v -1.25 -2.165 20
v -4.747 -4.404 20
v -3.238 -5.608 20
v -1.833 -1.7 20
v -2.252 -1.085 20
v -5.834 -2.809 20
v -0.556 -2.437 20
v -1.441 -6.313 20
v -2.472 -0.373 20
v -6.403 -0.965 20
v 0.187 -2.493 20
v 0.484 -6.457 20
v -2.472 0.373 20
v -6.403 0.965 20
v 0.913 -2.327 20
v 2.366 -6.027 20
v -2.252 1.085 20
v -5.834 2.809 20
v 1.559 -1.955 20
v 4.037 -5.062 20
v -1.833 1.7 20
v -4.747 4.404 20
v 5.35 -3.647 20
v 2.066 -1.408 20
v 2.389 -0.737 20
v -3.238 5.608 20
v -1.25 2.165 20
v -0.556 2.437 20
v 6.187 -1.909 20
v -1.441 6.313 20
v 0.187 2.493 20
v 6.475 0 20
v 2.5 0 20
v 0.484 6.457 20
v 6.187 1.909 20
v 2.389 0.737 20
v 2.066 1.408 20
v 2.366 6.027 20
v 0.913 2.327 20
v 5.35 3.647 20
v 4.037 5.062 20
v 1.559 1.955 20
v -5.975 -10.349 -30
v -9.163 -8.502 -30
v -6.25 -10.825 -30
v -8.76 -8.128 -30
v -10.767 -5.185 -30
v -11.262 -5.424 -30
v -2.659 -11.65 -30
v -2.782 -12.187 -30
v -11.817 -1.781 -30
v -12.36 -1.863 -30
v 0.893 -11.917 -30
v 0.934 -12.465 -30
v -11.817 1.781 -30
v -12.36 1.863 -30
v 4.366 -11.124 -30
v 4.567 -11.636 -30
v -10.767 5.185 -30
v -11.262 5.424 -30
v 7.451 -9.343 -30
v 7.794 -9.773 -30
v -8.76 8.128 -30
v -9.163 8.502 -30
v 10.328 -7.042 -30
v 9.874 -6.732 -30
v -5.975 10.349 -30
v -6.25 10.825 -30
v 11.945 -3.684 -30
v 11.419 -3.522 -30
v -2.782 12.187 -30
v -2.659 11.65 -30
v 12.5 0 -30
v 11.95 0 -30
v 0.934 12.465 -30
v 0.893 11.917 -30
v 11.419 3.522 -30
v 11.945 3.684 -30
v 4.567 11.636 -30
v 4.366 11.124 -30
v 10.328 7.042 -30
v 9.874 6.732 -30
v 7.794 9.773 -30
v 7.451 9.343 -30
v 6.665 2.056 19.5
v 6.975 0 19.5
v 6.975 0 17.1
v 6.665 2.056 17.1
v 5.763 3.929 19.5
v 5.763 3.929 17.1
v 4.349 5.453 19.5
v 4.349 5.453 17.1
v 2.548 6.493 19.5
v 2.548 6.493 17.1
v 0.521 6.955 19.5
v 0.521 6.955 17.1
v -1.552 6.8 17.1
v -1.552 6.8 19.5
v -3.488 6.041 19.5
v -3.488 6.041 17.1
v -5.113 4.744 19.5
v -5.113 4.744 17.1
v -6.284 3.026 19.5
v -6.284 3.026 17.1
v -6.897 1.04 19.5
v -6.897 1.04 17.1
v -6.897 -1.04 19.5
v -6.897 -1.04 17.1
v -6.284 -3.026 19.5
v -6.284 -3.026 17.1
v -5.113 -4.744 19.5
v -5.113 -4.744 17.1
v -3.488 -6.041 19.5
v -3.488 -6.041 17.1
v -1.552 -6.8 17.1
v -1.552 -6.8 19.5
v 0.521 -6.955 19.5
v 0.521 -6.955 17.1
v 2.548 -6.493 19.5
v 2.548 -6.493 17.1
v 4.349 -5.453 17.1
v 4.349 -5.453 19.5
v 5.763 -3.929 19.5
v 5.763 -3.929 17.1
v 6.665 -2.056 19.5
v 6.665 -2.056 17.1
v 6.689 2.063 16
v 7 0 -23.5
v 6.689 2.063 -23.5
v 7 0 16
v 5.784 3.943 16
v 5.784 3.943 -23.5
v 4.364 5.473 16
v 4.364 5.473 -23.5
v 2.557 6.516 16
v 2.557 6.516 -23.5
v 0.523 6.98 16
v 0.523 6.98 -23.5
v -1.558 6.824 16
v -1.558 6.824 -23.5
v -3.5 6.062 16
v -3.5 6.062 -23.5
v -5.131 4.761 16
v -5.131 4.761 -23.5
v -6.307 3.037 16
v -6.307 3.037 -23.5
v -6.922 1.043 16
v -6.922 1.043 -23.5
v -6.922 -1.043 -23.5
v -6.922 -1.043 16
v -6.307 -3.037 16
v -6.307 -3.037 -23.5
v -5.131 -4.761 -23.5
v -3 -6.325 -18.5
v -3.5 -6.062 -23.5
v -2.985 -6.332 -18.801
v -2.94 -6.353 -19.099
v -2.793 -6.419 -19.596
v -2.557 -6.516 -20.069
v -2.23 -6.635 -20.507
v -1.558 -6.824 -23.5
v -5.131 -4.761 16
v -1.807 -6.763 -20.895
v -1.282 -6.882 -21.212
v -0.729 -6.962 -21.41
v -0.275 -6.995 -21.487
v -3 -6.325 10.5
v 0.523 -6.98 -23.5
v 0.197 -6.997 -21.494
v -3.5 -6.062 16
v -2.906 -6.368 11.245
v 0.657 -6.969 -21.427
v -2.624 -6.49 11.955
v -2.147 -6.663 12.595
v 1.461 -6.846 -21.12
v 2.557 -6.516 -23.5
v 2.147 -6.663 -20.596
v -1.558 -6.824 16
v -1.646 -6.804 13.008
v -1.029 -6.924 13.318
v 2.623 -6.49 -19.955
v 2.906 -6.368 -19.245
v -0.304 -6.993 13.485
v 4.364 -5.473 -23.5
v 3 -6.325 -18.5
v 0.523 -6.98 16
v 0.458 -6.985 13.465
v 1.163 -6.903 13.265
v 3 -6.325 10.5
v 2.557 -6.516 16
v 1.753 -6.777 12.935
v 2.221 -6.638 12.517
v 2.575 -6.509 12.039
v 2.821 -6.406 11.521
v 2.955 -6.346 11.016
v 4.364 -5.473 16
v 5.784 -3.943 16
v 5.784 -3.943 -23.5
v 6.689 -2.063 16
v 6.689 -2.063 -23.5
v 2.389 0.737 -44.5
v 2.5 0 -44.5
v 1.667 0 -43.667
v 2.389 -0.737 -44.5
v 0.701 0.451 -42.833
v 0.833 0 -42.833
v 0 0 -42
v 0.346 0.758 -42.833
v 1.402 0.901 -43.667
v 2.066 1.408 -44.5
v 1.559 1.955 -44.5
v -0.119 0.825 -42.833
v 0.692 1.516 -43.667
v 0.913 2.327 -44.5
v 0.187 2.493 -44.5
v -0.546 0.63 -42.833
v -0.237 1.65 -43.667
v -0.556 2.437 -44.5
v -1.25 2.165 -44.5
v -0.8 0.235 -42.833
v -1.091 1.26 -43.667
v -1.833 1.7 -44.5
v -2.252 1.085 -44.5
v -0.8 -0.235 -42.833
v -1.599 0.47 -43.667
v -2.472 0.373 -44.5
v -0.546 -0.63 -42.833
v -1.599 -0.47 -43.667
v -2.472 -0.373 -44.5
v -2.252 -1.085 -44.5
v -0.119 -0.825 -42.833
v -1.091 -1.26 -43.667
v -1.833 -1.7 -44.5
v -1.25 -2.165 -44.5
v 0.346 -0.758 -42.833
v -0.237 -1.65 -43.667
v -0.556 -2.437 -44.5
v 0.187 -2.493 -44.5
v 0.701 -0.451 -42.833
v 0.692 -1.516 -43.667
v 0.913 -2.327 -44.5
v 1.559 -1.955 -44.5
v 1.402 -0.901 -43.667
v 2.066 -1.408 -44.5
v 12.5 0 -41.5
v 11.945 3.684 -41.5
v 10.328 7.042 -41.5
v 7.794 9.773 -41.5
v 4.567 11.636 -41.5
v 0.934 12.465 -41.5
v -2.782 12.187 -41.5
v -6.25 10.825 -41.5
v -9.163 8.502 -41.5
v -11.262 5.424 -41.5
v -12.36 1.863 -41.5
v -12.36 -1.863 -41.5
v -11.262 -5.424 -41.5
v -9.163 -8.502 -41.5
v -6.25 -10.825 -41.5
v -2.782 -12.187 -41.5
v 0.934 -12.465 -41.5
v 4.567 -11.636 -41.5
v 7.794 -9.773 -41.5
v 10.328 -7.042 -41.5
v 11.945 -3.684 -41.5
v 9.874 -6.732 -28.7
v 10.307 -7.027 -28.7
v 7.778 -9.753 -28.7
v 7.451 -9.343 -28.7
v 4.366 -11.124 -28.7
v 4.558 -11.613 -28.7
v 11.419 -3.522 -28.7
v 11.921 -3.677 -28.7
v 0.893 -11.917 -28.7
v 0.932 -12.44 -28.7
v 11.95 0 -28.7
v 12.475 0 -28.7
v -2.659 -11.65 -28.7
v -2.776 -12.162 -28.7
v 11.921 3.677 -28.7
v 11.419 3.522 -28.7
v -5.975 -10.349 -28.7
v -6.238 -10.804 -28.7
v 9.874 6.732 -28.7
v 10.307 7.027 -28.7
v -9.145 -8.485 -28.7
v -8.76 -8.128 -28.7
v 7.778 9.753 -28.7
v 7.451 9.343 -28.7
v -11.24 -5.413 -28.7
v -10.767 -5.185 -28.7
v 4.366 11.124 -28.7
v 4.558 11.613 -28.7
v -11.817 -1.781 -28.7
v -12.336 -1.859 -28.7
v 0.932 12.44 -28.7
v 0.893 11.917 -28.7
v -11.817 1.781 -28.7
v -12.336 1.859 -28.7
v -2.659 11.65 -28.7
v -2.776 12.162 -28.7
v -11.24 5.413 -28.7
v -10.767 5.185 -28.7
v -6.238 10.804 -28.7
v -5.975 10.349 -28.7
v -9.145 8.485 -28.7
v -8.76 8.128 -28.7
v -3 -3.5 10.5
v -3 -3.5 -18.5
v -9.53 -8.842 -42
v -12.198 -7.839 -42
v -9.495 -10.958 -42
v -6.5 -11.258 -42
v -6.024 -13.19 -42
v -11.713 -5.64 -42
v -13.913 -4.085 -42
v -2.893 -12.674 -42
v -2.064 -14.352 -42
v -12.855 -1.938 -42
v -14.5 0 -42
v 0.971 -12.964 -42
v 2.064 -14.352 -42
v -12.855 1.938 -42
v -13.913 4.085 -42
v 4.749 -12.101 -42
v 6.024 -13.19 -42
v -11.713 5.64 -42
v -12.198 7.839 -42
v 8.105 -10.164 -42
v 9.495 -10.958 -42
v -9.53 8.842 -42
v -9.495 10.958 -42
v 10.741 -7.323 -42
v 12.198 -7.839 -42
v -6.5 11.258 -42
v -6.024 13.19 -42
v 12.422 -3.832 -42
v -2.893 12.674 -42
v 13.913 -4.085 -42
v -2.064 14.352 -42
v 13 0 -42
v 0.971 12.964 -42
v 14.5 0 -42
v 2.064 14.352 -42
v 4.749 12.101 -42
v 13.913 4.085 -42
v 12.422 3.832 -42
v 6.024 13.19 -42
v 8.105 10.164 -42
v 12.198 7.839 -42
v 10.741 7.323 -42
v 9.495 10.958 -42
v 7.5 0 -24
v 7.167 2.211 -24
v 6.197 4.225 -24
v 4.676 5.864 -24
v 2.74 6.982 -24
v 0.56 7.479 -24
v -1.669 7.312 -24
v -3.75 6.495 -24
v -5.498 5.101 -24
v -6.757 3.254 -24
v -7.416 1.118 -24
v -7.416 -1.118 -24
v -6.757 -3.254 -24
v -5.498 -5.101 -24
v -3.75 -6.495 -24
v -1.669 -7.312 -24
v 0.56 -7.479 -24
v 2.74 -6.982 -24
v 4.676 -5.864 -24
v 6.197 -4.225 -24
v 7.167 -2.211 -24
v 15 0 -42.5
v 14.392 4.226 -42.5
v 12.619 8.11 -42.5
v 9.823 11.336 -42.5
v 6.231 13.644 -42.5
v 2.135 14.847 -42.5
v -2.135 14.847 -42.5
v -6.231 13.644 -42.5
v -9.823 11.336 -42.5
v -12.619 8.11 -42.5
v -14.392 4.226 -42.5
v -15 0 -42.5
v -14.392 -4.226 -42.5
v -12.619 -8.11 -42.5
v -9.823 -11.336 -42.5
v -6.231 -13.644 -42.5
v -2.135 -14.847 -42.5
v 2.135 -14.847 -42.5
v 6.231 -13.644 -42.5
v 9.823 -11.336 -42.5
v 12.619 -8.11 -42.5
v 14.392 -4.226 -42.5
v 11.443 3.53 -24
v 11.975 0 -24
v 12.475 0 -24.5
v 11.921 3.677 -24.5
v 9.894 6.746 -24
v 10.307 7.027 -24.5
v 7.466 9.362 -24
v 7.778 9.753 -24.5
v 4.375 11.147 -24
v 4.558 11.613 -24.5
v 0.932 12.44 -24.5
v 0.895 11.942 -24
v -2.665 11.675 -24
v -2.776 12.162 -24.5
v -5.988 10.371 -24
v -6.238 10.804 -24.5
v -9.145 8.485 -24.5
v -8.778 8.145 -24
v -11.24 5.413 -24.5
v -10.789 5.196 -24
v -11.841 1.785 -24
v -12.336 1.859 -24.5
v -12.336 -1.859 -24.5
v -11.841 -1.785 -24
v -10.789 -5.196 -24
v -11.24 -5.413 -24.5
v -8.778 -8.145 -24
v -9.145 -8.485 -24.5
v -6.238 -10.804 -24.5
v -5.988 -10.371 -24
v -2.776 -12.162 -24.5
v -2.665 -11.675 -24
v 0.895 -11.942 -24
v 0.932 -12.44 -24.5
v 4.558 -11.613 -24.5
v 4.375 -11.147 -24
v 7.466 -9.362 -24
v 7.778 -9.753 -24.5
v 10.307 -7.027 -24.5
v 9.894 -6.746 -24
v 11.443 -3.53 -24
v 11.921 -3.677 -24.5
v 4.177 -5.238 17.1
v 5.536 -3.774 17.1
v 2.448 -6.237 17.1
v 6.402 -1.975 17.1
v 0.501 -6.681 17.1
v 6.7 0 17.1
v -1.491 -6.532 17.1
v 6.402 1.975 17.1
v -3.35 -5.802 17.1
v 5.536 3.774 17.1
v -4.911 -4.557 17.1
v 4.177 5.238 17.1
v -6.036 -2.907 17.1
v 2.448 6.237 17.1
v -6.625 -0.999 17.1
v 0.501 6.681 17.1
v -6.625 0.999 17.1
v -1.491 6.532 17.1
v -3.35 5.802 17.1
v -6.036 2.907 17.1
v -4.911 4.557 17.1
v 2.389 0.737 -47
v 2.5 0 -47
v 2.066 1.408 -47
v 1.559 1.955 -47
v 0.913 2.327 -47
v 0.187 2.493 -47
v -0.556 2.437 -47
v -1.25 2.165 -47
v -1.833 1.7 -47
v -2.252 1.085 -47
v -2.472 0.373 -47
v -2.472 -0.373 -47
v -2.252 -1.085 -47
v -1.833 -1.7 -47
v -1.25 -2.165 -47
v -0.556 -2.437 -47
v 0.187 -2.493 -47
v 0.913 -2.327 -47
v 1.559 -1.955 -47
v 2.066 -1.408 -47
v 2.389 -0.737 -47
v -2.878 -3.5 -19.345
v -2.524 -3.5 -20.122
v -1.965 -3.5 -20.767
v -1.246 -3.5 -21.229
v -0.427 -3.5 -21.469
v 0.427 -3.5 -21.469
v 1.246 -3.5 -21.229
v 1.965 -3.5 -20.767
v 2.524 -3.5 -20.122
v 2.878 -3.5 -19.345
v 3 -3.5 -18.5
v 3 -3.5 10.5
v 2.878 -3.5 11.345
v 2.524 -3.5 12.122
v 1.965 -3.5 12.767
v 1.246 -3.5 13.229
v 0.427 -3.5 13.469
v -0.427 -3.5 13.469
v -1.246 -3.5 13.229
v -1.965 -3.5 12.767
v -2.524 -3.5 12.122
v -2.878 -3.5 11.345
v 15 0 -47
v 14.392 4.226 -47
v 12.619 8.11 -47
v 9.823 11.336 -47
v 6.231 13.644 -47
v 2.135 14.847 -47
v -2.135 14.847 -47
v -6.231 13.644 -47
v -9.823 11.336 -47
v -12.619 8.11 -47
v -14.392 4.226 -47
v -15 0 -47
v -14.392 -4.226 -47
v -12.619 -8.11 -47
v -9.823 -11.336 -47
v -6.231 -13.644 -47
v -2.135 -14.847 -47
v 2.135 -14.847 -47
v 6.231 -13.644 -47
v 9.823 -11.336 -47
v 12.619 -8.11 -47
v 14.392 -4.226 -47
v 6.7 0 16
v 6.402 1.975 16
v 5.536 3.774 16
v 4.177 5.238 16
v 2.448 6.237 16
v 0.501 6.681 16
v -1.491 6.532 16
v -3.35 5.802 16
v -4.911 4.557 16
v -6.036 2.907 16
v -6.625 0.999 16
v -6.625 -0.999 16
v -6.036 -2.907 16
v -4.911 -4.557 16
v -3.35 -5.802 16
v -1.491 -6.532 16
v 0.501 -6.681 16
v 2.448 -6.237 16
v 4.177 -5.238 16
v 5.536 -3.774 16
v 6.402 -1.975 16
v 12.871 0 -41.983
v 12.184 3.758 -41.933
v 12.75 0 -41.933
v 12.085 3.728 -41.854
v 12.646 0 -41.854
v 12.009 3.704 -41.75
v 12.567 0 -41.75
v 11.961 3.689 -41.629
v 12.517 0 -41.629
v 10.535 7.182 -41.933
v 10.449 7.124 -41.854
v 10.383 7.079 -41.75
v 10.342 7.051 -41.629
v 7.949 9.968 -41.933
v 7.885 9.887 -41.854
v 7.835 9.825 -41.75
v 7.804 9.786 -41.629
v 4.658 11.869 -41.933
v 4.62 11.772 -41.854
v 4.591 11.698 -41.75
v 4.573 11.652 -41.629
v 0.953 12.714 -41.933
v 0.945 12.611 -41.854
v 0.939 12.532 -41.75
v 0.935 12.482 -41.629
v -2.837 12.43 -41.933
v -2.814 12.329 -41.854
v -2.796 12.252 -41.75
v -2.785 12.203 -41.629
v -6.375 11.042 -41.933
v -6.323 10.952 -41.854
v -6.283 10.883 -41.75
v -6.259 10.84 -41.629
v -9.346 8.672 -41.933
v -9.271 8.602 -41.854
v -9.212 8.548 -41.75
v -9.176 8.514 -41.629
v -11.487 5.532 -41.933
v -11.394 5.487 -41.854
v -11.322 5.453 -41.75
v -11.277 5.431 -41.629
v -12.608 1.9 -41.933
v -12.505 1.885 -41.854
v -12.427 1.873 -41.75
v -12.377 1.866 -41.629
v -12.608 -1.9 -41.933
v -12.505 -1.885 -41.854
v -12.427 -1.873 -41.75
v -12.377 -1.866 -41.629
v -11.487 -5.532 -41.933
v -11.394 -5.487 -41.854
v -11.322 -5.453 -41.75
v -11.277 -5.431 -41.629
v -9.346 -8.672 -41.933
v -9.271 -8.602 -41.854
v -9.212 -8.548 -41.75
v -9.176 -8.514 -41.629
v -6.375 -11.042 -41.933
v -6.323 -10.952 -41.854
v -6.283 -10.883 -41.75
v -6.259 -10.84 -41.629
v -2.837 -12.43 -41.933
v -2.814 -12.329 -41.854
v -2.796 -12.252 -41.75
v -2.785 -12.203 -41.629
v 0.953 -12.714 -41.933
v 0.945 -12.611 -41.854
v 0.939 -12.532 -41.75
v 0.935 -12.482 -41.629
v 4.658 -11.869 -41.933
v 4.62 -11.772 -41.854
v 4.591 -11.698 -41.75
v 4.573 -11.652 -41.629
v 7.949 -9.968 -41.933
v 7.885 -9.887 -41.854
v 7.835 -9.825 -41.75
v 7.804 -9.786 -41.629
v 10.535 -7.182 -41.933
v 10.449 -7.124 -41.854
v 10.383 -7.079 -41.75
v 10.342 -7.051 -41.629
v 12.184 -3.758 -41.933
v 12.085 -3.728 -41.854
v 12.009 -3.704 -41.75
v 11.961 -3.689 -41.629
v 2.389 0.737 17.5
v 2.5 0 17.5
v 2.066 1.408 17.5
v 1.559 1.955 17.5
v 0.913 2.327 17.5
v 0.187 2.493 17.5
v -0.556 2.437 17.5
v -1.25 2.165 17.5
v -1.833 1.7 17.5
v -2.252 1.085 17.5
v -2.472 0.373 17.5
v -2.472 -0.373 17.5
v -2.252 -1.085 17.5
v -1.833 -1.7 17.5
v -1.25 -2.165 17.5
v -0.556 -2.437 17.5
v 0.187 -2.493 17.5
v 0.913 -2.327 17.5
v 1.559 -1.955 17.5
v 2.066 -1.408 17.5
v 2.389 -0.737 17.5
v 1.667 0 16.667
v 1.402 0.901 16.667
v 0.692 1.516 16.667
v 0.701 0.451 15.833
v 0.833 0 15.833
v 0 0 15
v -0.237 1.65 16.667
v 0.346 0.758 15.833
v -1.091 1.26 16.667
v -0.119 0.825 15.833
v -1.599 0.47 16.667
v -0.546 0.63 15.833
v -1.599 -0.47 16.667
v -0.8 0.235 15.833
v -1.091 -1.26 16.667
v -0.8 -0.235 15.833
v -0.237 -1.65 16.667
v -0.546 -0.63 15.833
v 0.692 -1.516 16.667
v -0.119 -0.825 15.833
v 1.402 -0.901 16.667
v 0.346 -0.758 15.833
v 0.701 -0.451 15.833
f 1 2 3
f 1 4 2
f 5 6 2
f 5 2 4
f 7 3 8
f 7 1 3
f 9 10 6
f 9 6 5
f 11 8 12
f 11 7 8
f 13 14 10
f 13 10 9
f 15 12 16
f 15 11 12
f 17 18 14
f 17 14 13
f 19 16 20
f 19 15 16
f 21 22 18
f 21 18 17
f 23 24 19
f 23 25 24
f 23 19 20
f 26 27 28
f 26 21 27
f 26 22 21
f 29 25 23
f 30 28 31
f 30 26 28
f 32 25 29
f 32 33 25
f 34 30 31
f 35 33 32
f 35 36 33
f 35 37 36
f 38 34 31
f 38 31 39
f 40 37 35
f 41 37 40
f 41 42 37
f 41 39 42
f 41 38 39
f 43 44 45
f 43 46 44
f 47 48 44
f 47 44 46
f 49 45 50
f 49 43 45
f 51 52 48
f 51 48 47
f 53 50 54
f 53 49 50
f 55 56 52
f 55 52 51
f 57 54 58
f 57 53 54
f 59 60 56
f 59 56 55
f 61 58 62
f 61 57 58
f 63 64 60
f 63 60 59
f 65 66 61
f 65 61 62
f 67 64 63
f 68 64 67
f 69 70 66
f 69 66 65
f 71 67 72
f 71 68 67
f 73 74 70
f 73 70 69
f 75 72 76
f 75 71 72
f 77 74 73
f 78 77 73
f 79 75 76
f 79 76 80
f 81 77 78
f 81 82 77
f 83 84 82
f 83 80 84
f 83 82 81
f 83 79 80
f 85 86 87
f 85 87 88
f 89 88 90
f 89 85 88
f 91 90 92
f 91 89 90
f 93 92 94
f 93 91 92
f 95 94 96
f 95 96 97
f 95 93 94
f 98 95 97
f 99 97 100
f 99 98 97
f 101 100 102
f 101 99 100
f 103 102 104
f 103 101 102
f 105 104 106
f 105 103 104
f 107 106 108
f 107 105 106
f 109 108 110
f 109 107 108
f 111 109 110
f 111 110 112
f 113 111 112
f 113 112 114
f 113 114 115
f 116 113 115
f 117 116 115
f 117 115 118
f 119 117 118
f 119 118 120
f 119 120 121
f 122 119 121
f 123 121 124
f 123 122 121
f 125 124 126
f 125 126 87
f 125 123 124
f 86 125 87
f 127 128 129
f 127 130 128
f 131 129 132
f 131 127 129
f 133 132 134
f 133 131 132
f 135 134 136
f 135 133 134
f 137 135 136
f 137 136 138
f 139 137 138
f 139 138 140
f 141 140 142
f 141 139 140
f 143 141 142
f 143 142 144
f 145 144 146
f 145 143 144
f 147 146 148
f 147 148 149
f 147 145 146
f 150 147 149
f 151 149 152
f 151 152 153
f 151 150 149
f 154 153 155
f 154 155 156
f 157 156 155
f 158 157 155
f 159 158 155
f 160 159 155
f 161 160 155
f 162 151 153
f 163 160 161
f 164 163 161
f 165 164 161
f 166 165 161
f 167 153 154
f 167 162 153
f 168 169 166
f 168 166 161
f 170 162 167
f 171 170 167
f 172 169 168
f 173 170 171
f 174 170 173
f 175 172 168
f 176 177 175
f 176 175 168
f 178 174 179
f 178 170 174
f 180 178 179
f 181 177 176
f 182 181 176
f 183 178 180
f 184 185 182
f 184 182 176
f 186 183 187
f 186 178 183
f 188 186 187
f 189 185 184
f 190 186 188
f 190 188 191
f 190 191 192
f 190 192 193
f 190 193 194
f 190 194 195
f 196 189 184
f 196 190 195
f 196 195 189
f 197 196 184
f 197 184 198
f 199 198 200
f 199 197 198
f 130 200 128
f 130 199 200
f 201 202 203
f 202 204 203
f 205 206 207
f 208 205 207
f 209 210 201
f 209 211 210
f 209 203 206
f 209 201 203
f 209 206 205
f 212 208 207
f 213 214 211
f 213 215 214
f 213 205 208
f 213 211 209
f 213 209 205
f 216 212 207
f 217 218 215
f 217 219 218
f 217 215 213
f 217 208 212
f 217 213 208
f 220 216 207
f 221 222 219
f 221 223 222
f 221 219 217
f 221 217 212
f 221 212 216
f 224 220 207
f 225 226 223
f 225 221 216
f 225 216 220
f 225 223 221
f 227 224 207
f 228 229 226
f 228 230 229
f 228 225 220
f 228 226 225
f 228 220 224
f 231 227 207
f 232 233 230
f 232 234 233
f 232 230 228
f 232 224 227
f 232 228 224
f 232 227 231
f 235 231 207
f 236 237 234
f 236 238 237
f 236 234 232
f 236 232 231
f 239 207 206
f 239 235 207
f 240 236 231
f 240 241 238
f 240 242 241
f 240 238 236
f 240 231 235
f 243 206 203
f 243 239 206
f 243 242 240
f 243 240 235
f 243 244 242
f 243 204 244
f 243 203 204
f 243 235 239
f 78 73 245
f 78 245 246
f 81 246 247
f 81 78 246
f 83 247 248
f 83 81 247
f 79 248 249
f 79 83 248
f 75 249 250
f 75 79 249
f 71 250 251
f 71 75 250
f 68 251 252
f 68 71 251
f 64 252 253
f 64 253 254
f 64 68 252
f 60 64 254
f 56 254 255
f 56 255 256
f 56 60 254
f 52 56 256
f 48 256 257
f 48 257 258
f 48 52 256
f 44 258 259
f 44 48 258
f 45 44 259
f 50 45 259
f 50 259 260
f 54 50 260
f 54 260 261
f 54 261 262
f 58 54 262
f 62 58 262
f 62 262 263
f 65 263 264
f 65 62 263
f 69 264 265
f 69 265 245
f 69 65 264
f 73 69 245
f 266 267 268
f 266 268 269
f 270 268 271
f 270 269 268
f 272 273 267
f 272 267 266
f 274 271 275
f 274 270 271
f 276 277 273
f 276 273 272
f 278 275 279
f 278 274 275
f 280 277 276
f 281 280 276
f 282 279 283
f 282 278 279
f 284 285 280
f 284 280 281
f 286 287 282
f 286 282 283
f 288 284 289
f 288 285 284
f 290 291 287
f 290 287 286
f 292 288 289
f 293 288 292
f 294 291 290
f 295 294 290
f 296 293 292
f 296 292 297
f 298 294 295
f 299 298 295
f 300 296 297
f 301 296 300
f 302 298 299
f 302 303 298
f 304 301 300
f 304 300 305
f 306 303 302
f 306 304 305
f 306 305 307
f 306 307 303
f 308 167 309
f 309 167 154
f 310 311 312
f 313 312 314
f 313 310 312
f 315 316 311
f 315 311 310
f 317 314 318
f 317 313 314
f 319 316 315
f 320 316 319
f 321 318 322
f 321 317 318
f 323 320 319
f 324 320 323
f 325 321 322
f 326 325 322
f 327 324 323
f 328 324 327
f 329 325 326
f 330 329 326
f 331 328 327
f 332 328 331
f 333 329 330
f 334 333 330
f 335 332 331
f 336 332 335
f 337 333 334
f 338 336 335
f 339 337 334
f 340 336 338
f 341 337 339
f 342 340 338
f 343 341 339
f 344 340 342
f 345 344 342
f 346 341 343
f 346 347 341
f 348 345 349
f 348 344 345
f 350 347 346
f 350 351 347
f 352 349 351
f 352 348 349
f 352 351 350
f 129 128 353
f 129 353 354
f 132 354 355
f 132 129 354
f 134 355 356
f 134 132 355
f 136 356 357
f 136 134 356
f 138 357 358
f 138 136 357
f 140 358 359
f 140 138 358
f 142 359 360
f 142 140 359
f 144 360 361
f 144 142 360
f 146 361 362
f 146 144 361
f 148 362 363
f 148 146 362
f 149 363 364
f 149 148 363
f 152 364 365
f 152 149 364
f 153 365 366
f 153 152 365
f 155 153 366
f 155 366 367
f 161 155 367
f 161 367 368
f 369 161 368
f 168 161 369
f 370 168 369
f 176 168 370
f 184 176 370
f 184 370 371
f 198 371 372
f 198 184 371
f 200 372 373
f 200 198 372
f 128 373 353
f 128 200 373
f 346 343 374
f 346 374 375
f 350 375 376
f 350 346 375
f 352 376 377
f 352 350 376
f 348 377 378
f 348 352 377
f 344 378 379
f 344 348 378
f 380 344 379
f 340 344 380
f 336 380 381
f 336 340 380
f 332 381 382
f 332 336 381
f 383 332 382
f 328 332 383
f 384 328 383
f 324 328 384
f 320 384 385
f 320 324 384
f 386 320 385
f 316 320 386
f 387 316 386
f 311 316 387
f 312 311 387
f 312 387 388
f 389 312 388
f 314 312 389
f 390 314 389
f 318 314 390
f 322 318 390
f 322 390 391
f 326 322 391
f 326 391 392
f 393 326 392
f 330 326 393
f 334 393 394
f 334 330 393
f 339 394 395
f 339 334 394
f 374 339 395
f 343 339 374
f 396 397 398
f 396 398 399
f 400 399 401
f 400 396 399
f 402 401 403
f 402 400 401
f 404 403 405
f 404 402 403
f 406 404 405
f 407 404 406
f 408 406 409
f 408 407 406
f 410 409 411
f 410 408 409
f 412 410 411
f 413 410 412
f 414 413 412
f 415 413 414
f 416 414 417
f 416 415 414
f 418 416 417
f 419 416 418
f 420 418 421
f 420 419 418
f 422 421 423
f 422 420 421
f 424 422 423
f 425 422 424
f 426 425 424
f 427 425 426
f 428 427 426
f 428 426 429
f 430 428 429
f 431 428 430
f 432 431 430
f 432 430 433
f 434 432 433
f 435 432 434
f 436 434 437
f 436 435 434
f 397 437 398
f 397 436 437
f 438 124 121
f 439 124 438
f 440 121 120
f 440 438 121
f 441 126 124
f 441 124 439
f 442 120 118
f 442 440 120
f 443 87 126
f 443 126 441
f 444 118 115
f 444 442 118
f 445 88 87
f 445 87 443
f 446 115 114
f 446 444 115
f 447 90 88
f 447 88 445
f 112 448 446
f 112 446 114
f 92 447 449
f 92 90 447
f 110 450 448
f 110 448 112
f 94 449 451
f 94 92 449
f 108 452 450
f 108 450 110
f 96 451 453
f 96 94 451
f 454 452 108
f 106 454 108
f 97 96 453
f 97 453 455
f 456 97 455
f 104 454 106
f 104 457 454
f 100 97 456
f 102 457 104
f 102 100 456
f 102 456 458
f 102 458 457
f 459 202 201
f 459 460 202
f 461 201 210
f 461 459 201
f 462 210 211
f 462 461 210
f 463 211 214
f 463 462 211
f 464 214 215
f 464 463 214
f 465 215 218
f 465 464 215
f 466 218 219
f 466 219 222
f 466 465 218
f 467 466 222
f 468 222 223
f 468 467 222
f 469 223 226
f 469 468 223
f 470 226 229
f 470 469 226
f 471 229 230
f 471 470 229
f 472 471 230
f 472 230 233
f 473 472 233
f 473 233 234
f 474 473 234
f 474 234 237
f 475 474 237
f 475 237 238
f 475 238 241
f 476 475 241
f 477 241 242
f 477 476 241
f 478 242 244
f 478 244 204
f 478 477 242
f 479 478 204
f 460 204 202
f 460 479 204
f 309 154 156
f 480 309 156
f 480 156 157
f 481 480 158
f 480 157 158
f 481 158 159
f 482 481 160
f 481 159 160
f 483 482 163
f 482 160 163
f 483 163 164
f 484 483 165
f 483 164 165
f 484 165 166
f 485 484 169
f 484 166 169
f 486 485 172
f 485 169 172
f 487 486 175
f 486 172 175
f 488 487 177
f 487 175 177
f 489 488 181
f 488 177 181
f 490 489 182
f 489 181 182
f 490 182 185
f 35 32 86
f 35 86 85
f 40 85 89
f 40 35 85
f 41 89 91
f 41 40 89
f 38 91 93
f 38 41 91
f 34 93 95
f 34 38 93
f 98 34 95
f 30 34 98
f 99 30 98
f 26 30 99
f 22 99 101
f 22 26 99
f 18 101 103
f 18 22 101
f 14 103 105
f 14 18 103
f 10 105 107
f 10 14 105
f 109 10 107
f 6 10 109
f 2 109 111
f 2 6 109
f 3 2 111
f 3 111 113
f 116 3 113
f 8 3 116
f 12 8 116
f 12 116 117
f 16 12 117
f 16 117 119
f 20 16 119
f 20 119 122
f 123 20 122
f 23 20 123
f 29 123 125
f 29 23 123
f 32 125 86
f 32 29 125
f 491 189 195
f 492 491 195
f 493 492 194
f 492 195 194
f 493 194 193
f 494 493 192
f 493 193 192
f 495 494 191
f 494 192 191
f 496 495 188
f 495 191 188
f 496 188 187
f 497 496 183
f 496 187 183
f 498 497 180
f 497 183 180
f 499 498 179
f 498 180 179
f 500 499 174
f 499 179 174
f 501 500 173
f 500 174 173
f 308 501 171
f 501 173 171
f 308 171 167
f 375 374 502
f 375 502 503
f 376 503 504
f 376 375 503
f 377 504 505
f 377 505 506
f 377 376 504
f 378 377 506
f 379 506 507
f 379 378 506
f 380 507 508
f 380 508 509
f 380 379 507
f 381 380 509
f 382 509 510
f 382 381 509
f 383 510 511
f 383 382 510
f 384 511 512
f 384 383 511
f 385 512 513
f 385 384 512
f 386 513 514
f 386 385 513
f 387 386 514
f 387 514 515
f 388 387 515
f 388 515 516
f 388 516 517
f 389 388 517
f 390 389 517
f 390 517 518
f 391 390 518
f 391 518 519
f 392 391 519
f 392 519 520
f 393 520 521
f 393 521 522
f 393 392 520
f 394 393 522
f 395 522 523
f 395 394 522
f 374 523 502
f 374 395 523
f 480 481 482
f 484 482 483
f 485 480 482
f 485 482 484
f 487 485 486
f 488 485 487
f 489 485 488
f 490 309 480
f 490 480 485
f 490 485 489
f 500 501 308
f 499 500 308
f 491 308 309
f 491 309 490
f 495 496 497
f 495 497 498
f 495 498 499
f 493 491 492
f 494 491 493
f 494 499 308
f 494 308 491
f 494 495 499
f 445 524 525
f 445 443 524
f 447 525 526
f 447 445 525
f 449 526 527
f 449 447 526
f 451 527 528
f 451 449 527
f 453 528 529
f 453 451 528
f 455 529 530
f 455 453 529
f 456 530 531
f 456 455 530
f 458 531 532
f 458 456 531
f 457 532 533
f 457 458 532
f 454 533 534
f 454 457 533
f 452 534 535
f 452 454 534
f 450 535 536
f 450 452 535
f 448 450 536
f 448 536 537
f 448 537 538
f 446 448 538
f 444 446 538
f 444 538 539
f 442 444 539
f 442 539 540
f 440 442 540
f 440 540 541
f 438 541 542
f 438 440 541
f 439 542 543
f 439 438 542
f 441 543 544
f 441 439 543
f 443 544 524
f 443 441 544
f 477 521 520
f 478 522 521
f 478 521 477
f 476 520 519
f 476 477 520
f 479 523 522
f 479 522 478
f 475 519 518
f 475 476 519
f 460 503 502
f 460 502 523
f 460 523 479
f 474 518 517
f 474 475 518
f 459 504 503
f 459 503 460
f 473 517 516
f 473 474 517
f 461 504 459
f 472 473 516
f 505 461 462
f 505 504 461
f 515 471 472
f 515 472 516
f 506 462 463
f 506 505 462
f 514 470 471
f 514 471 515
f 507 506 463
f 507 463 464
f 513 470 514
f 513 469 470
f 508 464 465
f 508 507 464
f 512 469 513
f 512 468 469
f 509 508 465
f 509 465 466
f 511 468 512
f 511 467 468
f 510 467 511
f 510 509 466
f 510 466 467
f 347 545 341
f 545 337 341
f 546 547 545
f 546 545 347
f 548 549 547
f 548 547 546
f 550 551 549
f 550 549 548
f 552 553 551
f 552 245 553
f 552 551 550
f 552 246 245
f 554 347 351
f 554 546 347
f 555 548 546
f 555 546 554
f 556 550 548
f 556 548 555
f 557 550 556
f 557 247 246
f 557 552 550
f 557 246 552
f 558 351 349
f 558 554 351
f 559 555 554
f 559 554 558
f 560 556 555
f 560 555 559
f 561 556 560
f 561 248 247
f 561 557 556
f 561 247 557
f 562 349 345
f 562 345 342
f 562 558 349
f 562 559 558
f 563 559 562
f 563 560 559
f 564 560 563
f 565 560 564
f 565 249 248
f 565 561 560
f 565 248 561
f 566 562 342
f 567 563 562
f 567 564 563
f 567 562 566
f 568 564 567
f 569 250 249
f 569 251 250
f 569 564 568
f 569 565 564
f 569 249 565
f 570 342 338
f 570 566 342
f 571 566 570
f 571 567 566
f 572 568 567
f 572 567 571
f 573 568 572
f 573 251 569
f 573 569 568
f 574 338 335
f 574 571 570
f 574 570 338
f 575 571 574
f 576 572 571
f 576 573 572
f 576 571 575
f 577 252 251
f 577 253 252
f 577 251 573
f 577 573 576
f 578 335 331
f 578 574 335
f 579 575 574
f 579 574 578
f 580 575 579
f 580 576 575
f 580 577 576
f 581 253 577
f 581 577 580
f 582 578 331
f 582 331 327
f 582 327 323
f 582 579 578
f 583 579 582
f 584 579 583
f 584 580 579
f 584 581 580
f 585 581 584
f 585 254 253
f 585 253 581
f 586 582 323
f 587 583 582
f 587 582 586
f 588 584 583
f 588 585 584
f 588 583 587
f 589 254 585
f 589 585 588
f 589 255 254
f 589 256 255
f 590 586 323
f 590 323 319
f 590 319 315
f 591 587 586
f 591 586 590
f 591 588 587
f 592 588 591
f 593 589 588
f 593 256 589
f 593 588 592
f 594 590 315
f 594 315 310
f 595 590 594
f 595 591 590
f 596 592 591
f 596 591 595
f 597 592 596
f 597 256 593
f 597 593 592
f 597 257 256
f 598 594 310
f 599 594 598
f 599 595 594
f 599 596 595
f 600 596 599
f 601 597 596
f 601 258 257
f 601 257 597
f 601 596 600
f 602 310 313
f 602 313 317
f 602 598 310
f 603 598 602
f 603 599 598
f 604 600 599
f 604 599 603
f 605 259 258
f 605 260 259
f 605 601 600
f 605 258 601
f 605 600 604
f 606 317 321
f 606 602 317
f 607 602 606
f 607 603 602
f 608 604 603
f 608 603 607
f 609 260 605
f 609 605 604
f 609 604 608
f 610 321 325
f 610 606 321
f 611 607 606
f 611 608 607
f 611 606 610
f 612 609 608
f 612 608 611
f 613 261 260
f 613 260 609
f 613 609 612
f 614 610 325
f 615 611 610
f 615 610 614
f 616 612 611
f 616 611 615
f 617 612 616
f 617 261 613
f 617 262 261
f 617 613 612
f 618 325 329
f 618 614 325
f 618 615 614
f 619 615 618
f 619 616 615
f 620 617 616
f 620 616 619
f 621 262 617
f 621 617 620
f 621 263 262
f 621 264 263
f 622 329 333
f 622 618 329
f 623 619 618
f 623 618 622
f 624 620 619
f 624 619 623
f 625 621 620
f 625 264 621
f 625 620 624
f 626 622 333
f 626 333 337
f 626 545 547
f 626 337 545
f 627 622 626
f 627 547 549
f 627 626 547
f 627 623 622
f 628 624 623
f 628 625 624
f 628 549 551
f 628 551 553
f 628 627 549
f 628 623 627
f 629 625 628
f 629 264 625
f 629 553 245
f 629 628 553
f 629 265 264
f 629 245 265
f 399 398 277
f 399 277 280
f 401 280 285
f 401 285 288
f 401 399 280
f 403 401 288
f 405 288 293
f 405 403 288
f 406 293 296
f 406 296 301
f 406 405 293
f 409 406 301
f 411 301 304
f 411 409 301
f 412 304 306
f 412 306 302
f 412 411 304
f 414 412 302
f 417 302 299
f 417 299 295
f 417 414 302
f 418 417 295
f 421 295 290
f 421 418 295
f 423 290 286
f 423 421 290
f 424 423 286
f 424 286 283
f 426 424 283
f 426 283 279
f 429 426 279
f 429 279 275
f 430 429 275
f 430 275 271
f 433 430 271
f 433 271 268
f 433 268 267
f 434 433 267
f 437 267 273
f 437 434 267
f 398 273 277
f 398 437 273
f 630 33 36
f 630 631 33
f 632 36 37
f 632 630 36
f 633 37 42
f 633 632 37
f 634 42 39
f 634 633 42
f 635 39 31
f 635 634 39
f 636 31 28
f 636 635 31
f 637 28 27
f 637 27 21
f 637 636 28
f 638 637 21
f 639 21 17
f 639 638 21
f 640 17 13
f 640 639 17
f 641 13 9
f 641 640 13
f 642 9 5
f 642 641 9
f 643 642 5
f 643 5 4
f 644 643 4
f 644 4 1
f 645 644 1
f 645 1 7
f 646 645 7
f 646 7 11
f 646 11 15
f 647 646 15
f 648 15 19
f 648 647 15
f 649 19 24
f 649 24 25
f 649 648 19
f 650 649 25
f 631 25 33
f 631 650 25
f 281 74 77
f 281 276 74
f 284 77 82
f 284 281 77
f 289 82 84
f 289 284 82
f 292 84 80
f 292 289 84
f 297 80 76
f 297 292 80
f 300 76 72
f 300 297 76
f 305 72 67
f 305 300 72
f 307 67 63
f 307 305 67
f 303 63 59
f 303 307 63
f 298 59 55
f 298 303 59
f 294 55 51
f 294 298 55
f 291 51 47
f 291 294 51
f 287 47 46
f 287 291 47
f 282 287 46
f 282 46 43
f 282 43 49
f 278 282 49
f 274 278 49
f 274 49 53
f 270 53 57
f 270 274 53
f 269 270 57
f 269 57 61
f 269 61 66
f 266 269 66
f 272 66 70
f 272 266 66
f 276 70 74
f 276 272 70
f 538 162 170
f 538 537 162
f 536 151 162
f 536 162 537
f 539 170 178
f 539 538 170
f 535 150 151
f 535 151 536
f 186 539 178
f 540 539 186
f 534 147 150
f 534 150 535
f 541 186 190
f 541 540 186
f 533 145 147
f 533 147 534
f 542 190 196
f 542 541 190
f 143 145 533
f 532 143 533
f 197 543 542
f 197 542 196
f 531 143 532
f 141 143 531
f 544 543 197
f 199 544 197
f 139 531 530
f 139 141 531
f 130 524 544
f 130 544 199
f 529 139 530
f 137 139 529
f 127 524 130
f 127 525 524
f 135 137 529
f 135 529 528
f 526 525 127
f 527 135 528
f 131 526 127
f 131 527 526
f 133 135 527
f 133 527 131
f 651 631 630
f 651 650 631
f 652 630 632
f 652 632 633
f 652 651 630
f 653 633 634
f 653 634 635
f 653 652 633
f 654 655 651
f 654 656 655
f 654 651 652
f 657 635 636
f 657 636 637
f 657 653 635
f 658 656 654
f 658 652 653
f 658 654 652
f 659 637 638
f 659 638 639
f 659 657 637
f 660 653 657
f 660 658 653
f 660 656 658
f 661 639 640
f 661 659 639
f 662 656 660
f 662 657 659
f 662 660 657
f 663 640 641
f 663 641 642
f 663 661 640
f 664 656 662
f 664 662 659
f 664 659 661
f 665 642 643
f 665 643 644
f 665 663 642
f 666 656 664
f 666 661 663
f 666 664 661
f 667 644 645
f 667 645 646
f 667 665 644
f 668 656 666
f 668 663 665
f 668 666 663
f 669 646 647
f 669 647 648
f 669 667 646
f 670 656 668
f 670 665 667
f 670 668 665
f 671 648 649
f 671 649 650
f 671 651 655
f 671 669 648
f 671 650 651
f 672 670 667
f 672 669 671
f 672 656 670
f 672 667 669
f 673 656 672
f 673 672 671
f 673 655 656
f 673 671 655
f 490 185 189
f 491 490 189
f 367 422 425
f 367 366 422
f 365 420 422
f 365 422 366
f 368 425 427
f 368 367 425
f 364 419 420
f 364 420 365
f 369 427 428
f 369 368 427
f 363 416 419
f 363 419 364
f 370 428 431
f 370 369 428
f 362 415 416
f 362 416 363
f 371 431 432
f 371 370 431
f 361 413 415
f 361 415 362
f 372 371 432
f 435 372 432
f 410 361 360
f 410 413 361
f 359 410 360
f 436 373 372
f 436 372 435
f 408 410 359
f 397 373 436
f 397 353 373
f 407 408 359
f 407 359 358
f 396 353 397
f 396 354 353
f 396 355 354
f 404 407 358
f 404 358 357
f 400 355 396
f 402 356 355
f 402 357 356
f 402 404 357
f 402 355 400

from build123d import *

# Parameters (mm, degrees)
F2_SIZE  = 0.5
F3_R     = 0.5
F6_DEPTH = 3.5


with BuildPart() as f1:
    # F0 (on Front) → F1 (revolve)
    with BuildSketch(Plane.XZ):
        Polygon((0, 15), (0, 0), (0, -42), (2.5, -44.5), (2.5, -47), (15, -47), (15, -45), (15, -42), (12.5, -42), (12.5, -30), (11.95, -30), (11.95, -28.7), (12.475, -28.7), (12.475, -24), (7, -24), (7, 16), (6.7, 16), (6.7, 17.1), (6.975, 17.1), (6.975, 20), (2.5, 20), (2.5, 17.5), align=None)
    revolve(axis=Axis((0, 0, 55.465363), (0, 0, 1)))

    # F2
    f2_edges = [f1.edges().sort_by_distance(p)[0] for p in [
        (-6.975, 0, 20),
        (-12.475, 0, -24),
        (-7, 0, -24),
        (-15, 0, -42),
    ]]
    chamfer(f2_edges, length=F2_SIZE)

    # F3
    f3_edges = [f1.edges().sort_by_distance(p)[0] for p in [
        (-12.5, 0, -42),
    ]]
    fillet(f3_edges, radius=F3_R)

    # F5 (on offset) → F6 (cut)
    with BuildSketch(Plane.XZ.offset(7)):
        with BuildLine():
            Line((3, -18.5), (3, 10.5))
            ThreePointArc((3, 10.5), (0, 13.5), (-3, 10.5))
            Line((-3, 10.5), (-3, -18.5))
            ThreePointArc((-3, -18.5), (0, -21.5), (3, -18.5))
        make_face()
    extrude(amount=-F6_DEPTH, mode=Mode.SUBTRACT)


solid = f1.part
